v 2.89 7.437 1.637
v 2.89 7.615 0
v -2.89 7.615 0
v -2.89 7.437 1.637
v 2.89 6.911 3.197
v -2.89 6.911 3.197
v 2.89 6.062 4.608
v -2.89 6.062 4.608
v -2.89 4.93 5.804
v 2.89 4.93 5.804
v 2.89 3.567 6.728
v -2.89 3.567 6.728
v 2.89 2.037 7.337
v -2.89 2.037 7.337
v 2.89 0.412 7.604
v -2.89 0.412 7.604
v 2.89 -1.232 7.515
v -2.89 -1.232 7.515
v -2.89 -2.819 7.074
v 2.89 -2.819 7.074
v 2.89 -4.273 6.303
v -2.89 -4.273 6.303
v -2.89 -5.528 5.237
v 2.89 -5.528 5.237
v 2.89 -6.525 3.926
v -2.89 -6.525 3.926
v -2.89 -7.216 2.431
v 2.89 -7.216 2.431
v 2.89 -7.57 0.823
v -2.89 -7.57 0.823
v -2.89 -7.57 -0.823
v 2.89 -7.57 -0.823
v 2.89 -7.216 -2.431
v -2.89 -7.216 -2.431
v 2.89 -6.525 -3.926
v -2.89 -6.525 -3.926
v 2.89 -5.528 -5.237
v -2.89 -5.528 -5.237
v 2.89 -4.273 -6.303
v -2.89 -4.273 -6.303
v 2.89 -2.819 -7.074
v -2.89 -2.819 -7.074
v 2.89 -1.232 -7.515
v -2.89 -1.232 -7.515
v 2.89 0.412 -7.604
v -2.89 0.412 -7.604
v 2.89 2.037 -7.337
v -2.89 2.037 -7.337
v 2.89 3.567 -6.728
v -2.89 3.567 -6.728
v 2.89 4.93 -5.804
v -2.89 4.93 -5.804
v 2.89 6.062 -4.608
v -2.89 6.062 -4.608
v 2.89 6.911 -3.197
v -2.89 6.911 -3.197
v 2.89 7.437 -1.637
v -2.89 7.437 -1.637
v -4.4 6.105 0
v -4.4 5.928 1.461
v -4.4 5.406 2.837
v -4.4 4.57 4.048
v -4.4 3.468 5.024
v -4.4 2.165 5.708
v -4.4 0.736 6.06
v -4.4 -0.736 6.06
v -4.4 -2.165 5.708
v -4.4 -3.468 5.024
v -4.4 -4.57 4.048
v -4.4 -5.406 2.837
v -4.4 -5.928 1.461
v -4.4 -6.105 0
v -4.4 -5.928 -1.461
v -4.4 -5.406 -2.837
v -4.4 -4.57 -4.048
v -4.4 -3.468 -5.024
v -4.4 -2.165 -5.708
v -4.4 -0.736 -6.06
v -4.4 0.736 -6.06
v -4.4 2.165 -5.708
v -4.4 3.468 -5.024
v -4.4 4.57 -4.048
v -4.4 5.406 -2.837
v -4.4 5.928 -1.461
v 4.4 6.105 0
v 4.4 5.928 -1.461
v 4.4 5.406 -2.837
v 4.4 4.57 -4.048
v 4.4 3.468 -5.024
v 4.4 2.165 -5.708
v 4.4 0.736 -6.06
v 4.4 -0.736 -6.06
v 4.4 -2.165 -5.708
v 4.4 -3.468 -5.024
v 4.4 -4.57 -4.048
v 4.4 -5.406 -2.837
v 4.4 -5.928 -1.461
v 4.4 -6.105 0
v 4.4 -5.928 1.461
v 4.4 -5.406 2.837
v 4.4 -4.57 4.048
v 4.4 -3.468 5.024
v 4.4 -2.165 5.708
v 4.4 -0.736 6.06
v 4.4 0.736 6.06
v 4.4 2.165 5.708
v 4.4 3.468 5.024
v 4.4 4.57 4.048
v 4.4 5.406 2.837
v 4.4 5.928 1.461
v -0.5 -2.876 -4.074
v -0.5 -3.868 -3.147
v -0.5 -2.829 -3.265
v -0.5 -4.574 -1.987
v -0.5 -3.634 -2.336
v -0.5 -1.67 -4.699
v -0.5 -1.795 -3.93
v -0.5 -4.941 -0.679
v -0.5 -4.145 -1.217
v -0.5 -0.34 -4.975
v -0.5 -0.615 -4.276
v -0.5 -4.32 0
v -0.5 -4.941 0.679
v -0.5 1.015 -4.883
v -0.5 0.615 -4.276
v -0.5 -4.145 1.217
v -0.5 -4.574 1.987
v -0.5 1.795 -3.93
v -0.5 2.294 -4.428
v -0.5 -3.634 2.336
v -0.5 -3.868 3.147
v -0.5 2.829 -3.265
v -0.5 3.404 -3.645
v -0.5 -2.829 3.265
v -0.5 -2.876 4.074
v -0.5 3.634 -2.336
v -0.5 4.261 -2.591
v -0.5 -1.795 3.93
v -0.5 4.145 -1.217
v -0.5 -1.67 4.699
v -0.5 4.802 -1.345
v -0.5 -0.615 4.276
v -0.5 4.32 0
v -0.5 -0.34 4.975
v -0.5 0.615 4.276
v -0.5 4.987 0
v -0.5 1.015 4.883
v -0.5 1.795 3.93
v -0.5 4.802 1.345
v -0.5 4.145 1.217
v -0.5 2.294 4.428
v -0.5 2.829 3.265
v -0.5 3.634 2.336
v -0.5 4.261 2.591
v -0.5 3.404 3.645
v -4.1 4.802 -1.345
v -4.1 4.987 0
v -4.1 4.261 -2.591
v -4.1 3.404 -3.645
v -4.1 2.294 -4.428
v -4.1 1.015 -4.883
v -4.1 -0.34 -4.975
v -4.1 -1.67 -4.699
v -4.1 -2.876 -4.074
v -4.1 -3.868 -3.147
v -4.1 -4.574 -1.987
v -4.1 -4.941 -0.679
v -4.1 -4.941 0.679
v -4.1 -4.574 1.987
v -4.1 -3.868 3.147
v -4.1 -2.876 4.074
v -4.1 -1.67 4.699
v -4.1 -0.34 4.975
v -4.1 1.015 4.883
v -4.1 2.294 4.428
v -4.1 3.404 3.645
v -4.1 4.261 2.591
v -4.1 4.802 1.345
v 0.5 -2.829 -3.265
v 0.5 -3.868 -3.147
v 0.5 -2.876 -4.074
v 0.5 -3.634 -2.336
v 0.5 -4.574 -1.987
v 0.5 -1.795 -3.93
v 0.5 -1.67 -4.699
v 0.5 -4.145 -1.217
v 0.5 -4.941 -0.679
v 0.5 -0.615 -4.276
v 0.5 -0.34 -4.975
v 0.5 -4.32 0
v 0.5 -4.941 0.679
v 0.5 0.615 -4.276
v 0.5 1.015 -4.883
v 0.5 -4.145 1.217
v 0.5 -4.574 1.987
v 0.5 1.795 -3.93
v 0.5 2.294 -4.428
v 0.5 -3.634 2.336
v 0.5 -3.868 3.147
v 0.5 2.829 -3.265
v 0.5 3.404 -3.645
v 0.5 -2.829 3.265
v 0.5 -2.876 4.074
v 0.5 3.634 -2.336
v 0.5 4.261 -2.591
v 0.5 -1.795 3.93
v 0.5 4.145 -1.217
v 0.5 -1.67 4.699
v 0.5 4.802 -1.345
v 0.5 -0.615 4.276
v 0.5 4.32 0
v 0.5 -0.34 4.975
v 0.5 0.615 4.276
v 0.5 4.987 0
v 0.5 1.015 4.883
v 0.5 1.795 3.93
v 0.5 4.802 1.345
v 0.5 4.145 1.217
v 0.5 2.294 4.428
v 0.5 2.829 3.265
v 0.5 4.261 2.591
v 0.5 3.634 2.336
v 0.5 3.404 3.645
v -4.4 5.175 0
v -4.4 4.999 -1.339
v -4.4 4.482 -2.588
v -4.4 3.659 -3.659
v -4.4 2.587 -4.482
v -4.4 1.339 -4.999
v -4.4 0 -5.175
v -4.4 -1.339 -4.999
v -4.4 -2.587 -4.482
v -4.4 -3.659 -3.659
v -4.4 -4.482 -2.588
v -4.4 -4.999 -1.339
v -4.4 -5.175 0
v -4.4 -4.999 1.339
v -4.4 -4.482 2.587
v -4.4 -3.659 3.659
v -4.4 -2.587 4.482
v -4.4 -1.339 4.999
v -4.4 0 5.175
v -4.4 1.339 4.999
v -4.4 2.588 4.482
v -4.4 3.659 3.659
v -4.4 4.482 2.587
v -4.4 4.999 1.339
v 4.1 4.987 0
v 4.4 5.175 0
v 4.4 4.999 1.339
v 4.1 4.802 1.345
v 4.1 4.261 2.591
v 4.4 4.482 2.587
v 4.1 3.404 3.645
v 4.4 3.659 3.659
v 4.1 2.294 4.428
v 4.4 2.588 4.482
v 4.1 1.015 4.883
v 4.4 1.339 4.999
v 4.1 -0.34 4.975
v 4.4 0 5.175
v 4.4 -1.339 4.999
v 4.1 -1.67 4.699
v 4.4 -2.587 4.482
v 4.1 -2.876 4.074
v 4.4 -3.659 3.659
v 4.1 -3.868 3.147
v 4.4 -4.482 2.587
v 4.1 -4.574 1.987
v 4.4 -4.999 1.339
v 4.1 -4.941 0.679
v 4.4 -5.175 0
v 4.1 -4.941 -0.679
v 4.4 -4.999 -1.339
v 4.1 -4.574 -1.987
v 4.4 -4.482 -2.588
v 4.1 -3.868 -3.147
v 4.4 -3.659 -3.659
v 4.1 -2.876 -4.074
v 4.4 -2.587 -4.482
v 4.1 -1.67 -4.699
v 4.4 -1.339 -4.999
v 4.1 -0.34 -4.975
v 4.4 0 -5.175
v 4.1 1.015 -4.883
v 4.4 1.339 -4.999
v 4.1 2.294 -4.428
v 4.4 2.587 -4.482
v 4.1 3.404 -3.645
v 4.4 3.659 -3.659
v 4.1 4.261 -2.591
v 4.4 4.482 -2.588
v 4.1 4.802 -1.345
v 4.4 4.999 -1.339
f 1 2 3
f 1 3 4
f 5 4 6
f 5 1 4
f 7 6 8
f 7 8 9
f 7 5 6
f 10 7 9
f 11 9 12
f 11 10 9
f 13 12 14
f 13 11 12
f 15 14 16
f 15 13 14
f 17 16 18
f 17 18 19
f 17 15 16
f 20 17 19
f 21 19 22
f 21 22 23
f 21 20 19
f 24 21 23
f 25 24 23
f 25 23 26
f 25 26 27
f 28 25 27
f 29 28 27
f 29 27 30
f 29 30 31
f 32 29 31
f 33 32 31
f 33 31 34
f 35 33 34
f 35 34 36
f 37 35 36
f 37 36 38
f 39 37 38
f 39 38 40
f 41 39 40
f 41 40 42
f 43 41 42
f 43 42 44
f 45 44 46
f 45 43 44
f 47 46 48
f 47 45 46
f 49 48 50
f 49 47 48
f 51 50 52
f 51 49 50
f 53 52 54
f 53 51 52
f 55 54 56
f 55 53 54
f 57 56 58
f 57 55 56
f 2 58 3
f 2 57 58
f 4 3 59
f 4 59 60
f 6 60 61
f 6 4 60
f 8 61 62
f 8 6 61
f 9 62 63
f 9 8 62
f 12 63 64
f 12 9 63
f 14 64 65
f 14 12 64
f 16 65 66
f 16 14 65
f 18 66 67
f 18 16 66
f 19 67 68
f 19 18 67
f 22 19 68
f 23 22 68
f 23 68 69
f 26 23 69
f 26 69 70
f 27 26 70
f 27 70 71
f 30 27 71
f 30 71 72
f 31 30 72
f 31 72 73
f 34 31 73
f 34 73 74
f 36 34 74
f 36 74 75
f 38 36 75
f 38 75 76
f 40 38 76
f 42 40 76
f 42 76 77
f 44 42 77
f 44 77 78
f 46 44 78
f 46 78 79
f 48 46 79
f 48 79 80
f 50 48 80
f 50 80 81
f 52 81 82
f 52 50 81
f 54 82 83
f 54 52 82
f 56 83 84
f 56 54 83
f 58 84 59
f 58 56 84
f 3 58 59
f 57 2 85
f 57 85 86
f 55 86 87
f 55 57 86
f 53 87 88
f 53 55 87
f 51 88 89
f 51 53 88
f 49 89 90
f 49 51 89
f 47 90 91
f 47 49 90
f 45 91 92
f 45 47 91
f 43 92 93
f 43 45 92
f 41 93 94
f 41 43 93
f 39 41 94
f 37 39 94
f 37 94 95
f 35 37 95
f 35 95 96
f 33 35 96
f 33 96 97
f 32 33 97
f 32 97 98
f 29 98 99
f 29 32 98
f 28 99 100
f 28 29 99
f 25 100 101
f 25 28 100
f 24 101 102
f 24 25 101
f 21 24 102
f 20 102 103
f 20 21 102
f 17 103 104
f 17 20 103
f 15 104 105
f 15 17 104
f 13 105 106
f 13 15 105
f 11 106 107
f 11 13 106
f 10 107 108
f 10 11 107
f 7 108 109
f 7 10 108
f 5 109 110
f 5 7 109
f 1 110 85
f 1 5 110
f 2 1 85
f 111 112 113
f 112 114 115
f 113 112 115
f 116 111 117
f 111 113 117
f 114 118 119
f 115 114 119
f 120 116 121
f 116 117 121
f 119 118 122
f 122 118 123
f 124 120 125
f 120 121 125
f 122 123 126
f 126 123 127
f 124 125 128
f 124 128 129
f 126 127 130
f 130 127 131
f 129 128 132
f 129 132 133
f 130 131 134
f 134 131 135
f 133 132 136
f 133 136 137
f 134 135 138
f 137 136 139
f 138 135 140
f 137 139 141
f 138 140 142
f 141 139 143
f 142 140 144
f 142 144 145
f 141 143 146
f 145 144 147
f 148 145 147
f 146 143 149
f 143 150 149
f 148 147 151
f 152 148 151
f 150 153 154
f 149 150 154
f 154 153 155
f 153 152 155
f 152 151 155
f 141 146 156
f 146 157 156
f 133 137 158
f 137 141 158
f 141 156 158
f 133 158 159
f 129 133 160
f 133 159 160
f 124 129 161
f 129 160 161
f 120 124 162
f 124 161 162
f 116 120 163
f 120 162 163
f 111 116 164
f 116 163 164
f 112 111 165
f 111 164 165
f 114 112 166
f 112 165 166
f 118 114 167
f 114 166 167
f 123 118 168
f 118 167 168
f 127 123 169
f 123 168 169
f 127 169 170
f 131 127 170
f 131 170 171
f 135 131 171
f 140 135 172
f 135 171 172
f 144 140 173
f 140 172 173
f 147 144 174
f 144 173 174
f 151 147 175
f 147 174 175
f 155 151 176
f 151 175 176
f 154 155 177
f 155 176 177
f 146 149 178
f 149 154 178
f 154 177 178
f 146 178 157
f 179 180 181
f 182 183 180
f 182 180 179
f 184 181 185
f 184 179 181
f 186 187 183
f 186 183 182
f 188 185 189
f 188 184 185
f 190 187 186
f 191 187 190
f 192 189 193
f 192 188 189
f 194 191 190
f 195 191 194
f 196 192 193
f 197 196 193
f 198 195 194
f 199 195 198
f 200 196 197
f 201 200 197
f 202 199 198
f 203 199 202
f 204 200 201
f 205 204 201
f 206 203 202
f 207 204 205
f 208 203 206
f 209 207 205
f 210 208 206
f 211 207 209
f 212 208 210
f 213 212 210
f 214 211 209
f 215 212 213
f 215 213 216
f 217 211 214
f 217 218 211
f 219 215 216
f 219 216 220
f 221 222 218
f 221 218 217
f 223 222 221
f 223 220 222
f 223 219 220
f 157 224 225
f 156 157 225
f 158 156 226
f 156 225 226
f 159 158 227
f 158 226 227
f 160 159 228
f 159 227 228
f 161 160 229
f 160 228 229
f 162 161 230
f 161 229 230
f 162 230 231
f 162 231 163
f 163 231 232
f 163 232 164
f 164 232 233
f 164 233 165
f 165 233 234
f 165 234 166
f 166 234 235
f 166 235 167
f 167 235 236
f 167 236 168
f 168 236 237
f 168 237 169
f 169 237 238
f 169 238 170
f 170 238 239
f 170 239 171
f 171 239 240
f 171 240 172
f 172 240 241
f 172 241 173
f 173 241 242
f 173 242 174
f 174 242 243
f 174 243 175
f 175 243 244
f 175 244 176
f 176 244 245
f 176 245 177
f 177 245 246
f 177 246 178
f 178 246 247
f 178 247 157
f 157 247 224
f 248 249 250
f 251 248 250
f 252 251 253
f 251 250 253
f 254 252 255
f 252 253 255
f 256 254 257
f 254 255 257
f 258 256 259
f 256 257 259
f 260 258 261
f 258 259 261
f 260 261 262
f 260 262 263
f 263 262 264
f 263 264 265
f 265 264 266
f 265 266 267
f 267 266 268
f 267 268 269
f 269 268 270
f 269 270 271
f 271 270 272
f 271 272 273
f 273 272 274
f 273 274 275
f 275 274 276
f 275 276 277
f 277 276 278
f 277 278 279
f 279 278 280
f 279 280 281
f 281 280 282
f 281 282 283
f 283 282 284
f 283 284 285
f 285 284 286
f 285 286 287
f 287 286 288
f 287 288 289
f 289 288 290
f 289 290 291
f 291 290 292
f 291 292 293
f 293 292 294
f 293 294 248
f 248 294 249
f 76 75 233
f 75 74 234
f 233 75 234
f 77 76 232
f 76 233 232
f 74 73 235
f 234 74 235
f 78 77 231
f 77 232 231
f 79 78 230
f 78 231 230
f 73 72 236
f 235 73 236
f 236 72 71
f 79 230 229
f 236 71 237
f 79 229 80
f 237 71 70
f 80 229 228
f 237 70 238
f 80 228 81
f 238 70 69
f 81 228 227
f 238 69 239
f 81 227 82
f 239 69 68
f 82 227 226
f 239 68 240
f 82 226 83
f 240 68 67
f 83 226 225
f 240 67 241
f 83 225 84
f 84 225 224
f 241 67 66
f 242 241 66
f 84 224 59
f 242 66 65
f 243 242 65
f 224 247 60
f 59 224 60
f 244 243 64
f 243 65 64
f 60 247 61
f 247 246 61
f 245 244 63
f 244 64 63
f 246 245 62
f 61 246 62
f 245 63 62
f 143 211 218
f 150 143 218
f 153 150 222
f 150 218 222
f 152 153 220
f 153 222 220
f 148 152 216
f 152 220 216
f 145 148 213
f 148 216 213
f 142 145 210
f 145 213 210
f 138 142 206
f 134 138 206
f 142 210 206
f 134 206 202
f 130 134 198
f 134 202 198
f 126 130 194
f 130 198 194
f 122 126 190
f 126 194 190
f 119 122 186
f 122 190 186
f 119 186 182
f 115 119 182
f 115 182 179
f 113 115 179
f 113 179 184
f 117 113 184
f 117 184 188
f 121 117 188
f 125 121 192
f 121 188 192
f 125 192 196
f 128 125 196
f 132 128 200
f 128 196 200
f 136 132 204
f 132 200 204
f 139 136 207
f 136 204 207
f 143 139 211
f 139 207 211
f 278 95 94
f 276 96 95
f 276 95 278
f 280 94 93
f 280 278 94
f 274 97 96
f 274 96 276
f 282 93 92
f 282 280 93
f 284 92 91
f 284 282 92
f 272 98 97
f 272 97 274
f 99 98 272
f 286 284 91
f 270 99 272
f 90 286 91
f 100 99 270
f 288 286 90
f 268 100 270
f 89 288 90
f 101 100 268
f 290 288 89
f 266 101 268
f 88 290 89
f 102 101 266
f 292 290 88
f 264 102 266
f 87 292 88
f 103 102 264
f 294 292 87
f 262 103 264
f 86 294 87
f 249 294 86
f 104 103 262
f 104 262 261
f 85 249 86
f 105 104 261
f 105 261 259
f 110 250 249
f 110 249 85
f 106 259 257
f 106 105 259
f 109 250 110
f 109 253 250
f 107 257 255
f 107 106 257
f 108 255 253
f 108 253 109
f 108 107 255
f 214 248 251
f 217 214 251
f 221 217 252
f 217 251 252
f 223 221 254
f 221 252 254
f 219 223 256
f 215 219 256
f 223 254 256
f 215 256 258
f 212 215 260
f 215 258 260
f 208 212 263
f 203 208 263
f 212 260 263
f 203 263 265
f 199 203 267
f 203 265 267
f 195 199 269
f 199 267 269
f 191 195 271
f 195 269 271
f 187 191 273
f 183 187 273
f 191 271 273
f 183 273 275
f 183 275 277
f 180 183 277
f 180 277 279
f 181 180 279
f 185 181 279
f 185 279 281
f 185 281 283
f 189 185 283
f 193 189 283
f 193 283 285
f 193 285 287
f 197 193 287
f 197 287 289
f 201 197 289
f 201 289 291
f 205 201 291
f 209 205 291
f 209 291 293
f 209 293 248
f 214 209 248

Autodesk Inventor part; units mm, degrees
ref_plane "YZ Plane" through (0, 0, 0) normal (1, 0, 0) x (0, 1, 0)
ref_plane "XY Plane" through (0, 0, 0) normal (0, 0, 1) x (1, 0, 0)
sketch "Эскиз4" plane through (0, 0, 0) normal (0, 0, 1) x (1, 0, 0)
  line L0 (-4.4, 7.615) -> (4.4, 7.615) construction
  line L1 (4.4, 7.615) -> (4.4, -7.615) construction
  line L2 (4.4, -7.615) -> (-4.4, -7.615) construction
  line L3 (-4.4, -7.615) -> (-4.4, 7.615) construction
  line L4 (-2.89, 7.615) -> (-2.89, -7.615) construction
  line L5 (2.89, 7.615) -> (2.89, -7.615) construction
  line L6 (-4.4, 6.105) -> (4.4, 6.105) construction
  line L7 (-4.4, -6.105) -> (4.4, -6.105) construction
  line L8 (-4.4, 5.175) -> (4.4, 5.175) construction
  line L9 (-4.4, -5.175) -> (4.4, -5.175) construction
  line L10 (-4.4, 4.987) -> (4.4, 4.987) construction
  line L11 (-4.4, -4.987) -> (4.4, -4.987) construction
  line L12 (-4.1, 7.615) -> (-4.1, -7.615) construction
  line L13 (4.1, 7.615) -> (4.1, -7.615) construction
  line L14 (-0.5, 7.615) -> (-0.5, -7.615) construction
  line L15 (0.5, 7.615) -> (0.5, -7.615) construction
  line L16 (-4.4, 4.32) -> (4.4, 4.32) construction
  line L17 (-4.4, -4.32) -> (4.4, -4.32) construction
  line L18 (-2.89, 7.615) -> (-4.4, 6.105)
  line L19 (-4.4, 6.105) -> (-4.4, 5.175)
  line L20 (-4.4, 5.175) -> (-4.1, 4.987)
  line L21 (-0.5, 4.987) -> (-4.1, 4.987)
  line L22 (-0.5, 4.32) -> (-0.5, 4.987)
  line L23 (-0.5, 4.32) -> (0.5, 4.32)
  line L24 (0.5, 4.32) -> (0.5, 4.987)
  line L25 (0.5, 4.987) -> (4.1, 4.987)
  line L26 (4.1, 4.987) -> (4.4, 5.175)
  line L27 (4.4, 5.175) -> (4.4, 6.105)
  line L28 (4.4, 6.105) -> (2.89, 7.615)
  line L29 (-2.89, 7.615) -> (2.89, 7.615)
  line L30 (-4.4, 0) -> (4.4, 0)
  point P0 (0, 0)
  point P1 (-4.4, 0)
  point P2 (0, 7.615)
  point P3 (0, 0)
  dimension "d17" = 8.8
  dimension "d18" = 15.23
  dimension "d19" = 5.78
  dimension "d20" = 2.89
  dimension "d21" = 12.21
  dimension "d22" = 6.105
  dimension "d23" = 10.35
  dimension "d24" = 5.175
  dimension "d25" = 9.974
  dimension "d26" = 4.987
  dimension "d27" = 0.3
  dimension "d28" = 0.3
  dimension "d29" = 0.5
  dimension "d30" = 1
  dimension "d31" = 8.64
  dimension "d32" = 4.32
  dimension "d33" = 8.8
  dimension "d34" = 7.615
revolve "Вращение2" add sketch "Эскиз4" angle 360 about axis through (-4.4, 0, 0) along (1, 0, 0)
ref_plane "РабПлоскость3" through (0, 7.615, 0) normal (0, 1, 0) x (-1, 0, 0)
sketch "Эскиз7" plane through (0, 7.615, 0) normal (0, 1, 0) x (-1, 0, 0)
  point P0 (0, 0)
ref_plane "Work Plane4" through (5.75, 0, 0) normal (1, 0, 0) x (0, 0, -1)
properties part number "CSW-1523"
